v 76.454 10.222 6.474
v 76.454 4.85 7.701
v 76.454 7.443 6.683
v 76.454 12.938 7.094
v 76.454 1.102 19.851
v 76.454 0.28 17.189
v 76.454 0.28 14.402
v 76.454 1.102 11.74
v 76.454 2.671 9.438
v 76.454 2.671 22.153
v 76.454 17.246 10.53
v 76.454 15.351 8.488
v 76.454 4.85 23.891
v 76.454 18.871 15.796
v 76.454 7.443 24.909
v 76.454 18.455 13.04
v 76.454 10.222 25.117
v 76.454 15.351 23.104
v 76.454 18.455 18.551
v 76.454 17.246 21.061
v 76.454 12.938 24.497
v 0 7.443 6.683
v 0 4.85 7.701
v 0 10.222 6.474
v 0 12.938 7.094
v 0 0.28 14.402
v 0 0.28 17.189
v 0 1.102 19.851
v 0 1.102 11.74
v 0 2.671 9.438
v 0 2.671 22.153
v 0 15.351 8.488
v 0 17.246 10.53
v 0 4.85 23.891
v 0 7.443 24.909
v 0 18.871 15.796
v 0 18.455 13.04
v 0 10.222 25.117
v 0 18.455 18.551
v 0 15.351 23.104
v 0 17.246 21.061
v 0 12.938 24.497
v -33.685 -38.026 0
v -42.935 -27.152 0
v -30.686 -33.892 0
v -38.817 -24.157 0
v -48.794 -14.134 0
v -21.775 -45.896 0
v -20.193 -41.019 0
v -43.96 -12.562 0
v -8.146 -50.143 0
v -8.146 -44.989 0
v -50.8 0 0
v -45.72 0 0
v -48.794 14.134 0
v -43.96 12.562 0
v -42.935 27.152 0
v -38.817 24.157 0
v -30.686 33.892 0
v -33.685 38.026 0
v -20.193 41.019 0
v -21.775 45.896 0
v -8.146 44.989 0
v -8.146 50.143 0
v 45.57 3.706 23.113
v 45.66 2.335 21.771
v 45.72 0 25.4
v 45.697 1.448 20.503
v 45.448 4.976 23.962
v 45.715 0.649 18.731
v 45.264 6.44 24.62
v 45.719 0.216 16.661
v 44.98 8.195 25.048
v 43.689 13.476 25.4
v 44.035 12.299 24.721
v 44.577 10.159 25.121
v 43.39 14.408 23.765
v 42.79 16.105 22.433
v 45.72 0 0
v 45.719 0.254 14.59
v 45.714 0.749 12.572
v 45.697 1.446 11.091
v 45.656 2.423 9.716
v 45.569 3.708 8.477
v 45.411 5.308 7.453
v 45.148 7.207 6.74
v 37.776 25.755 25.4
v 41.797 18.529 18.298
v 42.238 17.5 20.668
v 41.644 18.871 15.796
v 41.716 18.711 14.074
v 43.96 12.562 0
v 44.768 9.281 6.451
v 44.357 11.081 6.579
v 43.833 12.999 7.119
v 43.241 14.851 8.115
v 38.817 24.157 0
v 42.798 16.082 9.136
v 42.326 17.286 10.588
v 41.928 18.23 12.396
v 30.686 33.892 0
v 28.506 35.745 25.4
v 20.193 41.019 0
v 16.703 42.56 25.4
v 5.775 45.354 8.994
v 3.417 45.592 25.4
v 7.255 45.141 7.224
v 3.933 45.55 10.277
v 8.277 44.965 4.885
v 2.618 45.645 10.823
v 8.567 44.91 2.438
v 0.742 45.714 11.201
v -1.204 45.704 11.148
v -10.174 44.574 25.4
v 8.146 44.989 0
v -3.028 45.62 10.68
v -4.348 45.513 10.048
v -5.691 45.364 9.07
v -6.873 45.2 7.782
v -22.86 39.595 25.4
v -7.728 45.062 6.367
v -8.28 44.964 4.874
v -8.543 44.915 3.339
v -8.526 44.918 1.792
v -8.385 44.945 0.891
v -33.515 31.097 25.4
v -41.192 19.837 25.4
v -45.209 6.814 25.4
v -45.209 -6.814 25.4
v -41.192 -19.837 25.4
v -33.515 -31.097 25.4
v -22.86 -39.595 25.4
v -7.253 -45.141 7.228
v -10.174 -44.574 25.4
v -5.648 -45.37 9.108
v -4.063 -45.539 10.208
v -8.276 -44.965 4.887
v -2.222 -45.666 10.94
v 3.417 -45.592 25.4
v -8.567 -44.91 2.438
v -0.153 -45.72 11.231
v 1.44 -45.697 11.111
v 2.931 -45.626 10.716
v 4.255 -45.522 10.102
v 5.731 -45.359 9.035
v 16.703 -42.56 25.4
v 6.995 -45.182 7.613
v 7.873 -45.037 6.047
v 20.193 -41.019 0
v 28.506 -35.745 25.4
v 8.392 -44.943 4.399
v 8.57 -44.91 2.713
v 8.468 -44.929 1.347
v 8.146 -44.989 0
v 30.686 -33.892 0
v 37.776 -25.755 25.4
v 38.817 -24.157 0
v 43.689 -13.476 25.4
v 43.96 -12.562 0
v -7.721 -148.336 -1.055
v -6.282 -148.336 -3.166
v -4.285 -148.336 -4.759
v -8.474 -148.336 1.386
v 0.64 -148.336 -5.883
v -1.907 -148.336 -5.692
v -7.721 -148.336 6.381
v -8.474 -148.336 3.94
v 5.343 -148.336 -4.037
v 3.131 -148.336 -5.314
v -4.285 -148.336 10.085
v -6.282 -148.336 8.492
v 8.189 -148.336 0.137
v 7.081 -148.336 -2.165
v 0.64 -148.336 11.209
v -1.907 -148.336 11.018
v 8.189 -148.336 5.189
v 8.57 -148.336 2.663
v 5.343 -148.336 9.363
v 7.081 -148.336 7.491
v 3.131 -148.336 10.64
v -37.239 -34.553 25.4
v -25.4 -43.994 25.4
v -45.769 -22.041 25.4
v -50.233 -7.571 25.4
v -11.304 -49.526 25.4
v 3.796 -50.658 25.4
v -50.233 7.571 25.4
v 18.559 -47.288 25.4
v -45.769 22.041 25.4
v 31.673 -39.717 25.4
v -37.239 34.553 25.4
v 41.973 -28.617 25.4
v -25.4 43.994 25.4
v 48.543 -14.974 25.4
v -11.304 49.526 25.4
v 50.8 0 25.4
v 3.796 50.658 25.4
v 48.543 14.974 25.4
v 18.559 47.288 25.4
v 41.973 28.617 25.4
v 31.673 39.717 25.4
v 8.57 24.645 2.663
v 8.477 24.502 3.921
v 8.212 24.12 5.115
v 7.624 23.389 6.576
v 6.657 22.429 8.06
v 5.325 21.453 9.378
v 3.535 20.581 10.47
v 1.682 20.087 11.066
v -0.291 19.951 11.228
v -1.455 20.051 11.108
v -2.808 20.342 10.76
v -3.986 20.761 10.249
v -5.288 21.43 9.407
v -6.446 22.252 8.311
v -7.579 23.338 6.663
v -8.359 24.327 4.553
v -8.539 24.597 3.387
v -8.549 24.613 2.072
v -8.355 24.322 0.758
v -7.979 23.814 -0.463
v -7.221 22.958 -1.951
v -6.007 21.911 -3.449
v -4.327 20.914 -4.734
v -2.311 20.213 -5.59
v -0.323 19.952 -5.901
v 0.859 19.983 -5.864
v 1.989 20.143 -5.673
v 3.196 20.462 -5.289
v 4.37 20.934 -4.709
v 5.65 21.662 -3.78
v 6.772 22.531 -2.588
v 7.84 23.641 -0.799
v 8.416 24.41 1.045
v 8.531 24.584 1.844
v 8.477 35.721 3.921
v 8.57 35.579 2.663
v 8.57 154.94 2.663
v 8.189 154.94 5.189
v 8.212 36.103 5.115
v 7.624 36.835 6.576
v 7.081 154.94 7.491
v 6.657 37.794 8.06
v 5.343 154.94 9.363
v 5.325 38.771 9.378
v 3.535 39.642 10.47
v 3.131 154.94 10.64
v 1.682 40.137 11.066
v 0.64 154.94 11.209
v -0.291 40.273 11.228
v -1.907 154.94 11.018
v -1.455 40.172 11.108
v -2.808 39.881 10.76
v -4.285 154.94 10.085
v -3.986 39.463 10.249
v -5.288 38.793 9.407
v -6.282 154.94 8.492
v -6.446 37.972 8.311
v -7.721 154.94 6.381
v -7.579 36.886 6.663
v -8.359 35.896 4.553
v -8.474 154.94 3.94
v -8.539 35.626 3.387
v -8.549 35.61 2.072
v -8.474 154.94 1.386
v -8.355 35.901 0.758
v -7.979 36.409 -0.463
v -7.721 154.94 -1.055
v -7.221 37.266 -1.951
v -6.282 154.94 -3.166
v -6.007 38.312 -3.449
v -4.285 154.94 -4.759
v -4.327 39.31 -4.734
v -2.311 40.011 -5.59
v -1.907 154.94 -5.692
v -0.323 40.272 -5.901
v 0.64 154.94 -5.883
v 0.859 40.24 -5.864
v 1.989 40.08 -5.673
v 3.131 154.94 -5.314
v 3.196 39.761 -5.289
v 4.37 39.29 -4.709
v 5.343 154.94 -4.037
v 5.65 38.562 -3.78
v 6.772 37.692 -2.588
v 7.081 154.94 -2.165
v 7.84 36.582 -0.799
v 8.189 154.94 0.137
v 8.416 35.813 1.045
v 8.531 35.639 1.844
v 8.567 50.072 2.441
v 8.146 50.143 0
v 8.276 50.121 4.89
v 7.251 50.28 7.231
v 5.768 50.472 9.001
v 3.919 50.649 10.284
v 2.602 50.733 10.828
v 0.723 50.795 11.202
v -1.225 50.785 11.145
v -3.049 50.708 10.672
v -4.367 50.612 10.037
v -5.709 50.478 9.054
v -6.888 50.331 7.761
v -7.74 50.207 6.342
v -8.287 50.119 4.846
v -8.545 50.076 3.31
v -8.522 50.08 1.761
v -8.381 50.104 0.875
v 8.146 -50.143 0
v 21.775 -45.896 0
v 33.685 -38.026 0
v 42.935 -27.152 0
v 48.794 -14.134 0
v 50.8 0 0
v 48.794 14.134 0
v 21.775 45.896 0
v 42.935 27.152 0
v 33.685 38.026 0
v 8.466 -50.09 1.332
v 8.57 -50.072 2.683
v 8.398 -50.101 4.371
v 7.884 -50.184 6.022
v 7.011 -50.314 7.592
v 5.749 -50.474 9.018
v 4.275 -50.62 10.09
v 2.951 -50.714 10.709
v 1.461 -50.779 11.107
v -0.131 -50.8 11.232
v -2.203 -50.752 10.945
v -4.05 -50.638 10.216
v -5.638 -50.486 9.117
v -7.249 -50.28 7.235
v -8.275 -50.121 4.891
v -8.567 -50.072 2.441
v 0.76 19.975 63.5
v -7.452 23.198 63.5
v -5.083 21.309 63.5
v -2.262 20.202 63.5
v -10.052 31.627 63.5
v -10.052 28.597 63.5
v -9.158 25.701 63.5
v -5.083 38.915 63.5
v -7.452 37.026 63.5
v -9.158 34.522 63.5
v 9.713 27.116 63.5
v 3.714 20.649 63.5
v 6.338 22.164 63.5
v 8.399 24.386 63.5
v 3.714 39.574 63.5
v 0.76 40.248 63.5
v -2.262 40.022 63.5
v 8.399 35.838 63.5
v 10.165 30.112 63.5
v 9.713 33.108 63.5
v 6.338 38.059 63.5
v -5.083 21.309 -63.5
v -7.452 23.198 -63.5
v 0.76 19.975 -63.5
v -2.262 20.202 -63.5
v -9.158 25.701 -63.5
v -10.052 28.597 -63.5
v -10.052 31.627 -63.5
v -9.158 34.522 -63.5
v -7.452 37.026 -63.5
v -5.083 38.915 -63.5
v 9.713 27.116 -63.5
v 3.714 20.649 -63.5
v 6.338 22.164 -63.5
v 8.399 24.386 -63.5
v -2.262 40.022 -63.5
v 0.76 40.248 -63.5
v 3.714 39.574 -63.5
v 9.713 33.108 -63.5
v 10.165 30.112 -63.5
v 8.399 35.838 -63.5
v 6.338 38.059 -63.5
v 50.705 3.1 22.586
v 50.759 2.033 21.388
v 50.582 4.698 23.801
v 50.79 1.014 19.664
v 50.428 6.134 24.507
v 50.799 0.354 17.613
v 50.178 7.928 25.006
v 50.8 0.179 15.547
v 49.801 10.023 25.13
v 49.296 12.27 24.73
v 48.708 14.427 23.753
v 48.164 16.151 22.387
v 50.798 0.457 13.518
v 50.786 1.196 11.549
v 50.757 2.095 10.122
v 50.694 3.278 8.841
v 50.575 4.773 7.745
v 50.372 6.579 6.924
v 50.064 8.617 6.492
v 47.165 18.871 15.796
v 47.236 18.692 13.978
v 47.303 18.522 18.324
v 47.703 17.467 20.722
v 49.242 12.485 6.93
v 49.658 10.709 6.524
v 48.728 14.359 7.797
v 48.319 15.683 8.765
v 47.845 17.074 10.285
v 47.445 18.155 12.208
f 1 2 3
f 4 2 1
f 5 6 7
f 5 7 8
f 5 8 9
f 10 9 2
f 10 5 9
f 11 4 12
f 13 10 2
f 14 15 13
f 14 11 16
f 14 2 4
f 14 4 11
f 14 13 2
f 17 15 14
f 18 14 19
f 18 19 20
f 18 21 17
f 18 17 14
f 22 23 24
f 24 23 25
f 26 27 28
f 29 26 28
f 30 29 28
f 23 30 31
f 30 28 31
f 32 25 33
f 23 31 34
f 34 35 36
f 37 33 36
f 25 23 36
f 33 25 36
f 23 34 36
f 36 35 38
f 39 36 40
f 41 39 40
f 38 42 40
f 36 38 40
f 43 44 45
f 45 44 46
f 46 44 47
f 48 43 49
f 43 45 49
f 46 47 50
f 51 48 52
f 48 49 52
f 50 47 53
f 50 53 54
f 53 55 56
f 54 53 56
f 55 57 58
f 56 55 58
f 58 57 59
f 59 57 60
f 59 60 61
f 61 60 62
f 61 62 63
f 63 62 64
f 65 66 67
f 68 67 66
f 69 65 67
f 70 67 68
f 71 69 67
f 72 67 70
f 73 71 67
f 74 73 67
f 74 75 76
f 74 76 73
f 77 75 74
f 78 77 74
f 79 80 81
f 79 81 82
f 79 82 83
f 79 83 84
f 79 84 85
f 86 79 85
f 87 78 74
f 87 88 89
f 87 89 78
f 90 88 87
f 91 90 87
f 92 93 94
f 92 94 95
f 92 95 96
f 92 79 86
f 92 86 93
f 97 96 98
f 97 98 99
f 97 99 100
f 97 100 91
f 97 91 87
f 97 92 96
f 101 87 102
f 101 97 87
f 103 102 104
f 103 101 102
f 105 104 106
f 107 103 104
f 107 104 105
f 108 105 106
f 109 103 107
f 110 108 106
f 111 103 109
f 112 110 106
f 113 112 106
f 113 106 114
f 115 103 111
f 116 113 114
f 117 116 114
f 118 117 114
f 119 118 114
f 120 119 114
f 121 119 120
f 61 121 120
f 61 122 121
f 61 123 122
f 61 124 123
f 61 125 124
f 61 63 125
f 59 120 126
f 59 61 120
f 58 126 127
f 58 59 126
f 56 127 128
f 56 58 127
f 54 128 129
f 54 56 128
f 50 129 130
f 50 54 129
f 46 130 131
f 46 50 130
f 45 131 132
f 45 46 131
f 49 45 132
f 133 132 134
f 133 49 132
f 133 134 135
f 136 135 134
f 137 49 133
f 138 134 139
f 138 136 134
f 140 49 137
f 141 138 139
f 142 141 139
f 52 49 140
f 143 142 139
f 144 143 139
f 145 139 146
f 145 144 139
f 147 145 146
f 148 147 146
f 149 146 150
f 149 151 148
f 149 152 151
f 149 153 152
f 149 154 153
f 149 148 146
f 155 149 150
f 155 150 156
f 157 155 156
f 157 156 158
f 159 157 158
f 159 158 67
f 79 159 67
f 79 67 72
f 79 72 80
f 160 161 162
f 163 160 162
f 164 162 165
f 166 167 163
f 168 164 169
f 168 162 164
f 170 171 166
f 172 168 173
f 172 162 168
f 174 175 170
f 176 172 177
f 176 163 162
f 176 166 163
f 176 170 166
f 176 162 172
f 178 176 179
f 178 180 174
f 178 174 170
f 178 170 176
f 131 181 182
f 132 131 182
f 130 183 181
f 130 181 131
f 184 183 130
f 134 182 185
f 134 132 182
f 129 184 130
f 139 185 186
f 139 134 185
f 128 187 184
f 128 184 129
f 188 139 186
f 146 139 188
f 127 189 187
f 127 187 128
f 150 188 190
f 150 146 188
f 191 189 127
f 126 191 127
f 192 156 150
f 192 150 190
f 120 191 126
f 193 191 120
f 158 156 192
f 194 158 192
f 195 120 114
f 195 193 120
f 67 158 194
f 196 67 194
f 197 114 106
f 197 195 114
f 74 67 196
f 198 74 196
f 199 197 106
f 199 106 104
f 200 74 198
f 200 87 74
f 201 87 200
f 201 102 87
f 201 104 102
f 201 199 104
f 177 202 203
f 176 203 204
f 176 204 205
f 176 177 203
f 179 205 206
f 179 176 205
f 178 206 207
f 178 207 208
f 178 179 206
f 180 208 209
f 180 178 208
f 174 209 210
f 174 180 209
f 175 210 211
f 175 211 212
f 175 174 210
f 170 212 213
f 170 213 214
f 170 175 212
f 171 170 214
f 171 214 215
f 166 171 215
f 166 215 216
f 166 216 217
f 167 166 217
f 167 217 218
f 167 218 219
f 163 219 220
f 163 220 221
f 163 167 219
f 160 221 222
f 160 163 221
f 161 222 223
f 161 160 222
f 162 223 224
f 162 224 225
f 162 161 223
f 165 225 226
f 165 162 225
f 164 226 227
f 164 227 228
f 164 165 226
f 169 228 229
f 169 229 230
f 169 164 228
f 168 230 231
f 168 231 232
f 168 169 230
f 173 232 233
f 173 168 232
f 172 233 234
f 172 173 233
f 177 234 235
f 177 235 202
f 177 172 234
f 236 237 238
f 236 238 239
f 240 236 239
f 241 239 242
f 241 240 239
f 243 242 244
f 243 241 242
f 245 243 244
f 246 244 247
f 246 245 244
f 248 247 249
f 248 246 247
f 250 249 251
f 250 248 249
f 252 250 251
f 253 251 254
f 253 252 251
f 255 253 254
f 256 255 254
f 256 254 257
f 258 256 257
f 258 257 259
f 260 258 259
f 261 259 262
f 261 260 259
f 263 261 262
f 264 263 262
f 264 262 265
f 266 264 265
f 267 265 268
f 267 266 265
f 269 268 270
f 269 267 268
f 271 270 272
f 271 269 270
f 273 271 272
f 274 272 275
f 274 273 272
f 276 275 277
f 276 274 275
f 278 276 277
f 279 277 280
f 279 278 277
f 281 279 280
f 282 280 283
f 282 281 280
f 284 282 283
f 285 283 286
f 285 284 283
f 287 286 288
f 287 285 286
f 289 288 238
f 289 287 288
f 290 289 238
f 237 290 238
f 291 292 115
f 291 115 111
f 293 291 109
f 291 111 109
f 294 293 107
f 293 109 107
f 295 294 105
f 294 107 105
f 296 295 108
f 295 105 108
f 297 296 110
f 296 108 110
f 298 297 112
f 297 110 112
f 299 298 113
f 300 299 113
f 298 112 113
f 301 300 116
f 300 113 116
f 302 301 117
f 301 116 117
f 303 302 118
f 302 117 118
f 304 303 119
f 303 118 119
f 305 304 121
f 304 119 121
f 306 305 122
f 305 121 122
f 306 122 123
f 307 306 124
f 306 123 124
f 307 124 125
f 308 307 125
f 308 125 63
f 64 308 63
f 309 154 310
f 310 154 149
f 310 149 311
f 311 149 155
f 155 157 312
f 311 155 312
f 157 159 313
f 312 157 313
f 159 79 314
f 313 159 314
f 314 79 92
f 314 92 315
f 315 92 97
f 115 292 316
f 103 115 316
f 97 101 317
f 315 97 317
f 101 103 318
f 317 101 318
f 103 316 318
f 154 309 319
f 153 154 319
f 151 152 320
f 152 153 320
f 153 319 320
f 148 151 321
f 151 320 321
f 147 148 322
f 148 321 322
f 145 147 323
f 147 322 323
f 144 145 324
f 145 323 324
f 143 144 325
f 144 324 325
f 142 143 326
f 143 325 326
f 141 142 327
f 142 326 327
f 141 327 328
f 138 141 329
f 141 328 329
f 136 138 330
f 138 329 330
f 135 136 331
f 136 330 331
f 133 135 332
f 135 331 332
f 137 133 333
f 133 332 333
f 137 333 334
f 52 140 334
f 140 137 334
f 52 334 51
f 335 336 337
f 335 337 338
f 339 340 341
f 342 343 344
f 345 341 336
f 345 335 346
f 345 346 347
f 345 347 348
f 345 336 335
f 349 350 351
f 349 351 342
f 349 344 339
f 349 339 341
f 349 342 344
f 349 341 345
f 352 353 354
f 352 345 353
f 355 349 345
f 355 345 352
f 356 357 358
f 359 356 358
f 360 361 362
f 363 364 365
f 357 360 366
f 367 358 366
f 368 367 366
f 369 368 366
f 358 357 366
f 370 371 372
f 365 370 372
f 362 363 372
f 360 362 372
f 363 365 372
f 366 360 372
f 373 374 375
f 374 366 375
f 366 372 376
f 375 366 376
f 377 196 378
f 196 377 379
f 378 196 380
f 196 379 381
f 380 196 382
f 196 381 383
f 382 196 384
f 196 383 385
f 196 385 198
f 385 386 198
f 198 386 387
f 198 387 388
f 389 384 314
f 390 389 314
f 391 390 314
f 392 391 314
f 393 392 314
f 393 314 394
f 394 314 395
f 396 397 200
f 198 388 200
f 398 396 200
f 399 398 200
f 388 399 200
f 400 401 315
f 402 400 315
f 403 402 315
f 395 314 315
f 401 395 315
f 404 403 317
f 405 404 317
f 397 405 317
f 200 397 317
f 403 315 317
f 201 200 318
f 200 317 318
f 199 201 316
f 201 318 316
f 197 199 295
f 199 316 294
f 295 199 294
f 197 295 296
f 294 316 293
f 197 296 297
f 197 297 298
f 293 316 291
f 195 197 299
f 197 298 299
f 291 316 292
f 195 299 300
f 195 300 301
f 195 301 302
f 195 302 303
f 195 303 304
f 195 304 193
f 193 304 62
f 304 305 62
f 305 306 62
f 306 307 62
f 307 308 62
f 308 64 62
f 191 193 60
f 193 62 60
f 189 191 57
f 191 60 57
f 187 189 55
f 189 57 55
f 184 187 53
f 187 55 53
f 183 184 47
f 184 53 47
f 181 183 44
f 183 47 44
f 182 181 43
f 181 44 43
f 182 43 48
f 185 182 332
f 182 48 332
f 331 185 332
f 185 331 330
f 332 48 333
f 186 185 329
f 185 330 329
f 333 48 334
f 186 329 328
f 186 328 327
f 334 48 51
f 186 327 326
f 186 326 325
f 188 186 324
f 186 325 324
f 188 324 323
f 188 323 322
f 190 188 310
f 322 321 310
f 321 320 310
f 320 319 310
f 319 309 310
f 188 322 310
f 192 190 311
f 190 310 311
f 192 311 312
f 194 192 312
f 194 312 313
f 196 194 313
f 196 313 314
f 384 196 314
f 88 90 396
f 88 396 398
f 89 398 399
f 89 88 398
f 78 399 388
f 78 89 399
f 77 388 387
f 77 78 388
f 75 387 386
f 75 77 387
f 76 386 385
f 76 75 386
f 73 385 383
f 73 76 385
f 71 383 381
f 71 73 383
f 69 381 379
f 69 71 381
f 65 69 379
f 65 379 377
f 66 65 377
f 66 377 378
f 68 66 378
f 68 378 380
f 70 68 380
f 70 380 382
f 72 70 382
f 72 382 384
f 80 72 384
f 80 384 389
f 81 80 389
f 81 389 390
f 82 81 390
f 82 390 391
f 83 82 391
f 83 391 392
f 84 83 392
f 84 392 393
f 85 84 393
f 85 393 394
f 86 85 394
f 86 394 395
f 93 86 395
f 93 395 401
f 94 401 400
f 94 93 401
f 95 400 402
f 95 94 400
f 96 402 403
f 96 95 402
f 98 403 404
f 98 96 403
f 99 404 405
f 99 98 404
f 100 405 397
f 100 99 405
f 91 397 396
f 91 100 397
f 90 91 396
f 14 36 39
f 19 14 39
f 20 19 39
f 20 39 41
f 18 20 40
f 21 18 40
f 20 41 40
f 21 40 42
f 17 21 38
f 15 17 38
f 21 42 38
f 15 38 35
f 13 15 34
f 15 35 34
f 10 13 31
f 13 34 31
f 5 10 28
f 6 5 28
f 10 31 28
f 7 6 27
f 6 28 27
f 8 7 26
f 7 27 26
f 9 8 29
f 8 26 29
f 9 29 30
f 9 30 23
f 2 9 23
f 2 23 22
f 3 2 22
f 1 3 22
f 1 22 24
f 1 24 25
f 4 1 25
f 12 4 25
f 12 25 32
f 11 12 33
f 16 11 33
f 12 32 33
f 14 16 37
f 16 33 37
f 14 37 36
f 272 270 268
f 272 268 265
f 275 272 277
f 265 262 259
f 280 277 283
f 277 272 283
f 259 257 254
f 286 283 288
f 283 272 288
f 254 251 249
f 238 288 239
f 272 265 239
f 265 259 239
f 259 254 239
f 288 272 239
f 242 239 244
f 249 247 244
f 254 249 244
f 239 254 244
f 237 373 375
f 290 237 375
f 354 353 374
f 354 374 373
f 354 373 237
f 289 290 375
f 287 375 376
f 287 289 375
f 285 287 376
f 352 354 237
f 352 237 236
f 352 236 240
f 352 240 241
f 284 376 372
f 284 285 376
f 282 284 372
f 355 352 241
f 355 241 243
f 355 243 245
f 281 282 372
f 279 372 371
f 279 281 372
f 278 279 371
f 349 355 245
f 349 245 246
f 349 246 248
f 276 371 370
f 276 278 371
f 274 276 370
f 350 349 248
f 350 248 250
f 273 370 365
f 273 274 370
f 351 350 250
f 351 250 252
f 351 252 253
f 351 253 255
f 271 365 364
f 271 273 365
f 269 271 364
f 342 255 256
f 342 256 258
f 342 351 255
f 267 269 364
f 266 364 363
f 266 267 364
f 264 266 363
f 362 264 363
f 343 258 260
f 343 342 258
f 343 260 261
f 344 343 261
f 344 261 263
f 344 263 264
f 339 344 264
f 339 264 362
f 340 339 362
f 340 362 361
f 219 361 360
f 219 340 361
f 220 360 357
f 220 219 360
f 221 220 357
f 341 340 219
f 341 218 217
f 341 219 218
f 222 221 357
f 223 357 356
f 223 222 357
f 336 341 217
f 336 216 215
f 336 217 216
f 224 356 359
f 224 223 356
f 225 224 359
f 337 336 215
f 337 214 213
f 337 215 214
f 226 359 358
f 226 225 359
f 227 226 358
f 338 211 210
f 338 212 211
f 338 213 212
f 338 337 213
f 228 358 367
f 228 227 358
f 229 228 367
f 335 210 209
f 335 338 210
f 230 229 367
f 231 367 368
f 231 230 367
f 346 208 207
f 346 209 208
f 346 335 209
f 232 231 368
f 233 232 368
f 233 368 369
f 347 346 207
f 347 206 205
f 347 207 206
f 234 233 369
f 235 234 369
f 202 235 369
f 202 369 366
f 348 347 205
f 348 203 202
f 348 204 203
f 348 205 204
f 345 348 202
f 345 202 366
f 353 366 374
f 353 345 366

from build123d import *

# Parameters (mm, degrees)
F0_R     = 50.8
F1_DEPTH = 25.4
F2_T     = -5.08
F3_R     = 8.5698519832
F4_DEPTH = 148.336
F5_DEPTH = 154.94
F6_R     = 10.165051904
F7_DEPTH = 63.5
F8_R     = 9.3473873545
F9_DEPTH = 76.454


with BuildPart() as f1:
    # F0 (on Top) → F1 (new body)
    with BuildSketch(Plane.XY):
        Circle(F0_R)
    extrude(amount=F1_DEPTH)

    # F2
    f2_openings = [f1.faces().sort_by_distance(p)[0] for p in [
        (0, 0, 25.4),
        (0, 0, 0),
    ]]
    offset(amount=F2_T, openings=f2_openings)


with BuildPart() as f4:
    # F3 (on Front) → F4 (new body)
    with BuildSketch(Plane.XZ):
        with Locations((0, 2.6629630011)):
            Circle(F3_R)
    extrude(amount=F4_DEPTH)

    # F3 (on Front) → F5 (join)
    with BuildSketch(Plane.XZ):
        with Locations((0, 2.6629630011)):
            Circle(F3_R)
    extrude(amount=-F5_DEPTH)

    # F6 (on Top) → F7 (join, symmetric)
    with BuildSketch(Plane.XY):
        with Locations((0, 30.111702159)):
            Circle(F6_R)
    extrude(amount=F7_DEPTH, both=True)


with BuildPart() as f9:
    # F8 (on Right) → F9 (new body)
    with BuildSketch(Plane.YZ):
        with Locations((9.5232129097, 15.795622021)):
            Circle(F8_R)
    extrude(amount=F9_DEPTH)


with BuildPart() as f1_1:
    add(f1.part)

    # F10: cut F4
    add(f4.part, mode=Mode.SUBTRACT)

    # F11: cut F9
    add(f9.part, mode=Mode.SUBTRACT)


solid = Compound([f4.part, f9.part, f1_1.part])
